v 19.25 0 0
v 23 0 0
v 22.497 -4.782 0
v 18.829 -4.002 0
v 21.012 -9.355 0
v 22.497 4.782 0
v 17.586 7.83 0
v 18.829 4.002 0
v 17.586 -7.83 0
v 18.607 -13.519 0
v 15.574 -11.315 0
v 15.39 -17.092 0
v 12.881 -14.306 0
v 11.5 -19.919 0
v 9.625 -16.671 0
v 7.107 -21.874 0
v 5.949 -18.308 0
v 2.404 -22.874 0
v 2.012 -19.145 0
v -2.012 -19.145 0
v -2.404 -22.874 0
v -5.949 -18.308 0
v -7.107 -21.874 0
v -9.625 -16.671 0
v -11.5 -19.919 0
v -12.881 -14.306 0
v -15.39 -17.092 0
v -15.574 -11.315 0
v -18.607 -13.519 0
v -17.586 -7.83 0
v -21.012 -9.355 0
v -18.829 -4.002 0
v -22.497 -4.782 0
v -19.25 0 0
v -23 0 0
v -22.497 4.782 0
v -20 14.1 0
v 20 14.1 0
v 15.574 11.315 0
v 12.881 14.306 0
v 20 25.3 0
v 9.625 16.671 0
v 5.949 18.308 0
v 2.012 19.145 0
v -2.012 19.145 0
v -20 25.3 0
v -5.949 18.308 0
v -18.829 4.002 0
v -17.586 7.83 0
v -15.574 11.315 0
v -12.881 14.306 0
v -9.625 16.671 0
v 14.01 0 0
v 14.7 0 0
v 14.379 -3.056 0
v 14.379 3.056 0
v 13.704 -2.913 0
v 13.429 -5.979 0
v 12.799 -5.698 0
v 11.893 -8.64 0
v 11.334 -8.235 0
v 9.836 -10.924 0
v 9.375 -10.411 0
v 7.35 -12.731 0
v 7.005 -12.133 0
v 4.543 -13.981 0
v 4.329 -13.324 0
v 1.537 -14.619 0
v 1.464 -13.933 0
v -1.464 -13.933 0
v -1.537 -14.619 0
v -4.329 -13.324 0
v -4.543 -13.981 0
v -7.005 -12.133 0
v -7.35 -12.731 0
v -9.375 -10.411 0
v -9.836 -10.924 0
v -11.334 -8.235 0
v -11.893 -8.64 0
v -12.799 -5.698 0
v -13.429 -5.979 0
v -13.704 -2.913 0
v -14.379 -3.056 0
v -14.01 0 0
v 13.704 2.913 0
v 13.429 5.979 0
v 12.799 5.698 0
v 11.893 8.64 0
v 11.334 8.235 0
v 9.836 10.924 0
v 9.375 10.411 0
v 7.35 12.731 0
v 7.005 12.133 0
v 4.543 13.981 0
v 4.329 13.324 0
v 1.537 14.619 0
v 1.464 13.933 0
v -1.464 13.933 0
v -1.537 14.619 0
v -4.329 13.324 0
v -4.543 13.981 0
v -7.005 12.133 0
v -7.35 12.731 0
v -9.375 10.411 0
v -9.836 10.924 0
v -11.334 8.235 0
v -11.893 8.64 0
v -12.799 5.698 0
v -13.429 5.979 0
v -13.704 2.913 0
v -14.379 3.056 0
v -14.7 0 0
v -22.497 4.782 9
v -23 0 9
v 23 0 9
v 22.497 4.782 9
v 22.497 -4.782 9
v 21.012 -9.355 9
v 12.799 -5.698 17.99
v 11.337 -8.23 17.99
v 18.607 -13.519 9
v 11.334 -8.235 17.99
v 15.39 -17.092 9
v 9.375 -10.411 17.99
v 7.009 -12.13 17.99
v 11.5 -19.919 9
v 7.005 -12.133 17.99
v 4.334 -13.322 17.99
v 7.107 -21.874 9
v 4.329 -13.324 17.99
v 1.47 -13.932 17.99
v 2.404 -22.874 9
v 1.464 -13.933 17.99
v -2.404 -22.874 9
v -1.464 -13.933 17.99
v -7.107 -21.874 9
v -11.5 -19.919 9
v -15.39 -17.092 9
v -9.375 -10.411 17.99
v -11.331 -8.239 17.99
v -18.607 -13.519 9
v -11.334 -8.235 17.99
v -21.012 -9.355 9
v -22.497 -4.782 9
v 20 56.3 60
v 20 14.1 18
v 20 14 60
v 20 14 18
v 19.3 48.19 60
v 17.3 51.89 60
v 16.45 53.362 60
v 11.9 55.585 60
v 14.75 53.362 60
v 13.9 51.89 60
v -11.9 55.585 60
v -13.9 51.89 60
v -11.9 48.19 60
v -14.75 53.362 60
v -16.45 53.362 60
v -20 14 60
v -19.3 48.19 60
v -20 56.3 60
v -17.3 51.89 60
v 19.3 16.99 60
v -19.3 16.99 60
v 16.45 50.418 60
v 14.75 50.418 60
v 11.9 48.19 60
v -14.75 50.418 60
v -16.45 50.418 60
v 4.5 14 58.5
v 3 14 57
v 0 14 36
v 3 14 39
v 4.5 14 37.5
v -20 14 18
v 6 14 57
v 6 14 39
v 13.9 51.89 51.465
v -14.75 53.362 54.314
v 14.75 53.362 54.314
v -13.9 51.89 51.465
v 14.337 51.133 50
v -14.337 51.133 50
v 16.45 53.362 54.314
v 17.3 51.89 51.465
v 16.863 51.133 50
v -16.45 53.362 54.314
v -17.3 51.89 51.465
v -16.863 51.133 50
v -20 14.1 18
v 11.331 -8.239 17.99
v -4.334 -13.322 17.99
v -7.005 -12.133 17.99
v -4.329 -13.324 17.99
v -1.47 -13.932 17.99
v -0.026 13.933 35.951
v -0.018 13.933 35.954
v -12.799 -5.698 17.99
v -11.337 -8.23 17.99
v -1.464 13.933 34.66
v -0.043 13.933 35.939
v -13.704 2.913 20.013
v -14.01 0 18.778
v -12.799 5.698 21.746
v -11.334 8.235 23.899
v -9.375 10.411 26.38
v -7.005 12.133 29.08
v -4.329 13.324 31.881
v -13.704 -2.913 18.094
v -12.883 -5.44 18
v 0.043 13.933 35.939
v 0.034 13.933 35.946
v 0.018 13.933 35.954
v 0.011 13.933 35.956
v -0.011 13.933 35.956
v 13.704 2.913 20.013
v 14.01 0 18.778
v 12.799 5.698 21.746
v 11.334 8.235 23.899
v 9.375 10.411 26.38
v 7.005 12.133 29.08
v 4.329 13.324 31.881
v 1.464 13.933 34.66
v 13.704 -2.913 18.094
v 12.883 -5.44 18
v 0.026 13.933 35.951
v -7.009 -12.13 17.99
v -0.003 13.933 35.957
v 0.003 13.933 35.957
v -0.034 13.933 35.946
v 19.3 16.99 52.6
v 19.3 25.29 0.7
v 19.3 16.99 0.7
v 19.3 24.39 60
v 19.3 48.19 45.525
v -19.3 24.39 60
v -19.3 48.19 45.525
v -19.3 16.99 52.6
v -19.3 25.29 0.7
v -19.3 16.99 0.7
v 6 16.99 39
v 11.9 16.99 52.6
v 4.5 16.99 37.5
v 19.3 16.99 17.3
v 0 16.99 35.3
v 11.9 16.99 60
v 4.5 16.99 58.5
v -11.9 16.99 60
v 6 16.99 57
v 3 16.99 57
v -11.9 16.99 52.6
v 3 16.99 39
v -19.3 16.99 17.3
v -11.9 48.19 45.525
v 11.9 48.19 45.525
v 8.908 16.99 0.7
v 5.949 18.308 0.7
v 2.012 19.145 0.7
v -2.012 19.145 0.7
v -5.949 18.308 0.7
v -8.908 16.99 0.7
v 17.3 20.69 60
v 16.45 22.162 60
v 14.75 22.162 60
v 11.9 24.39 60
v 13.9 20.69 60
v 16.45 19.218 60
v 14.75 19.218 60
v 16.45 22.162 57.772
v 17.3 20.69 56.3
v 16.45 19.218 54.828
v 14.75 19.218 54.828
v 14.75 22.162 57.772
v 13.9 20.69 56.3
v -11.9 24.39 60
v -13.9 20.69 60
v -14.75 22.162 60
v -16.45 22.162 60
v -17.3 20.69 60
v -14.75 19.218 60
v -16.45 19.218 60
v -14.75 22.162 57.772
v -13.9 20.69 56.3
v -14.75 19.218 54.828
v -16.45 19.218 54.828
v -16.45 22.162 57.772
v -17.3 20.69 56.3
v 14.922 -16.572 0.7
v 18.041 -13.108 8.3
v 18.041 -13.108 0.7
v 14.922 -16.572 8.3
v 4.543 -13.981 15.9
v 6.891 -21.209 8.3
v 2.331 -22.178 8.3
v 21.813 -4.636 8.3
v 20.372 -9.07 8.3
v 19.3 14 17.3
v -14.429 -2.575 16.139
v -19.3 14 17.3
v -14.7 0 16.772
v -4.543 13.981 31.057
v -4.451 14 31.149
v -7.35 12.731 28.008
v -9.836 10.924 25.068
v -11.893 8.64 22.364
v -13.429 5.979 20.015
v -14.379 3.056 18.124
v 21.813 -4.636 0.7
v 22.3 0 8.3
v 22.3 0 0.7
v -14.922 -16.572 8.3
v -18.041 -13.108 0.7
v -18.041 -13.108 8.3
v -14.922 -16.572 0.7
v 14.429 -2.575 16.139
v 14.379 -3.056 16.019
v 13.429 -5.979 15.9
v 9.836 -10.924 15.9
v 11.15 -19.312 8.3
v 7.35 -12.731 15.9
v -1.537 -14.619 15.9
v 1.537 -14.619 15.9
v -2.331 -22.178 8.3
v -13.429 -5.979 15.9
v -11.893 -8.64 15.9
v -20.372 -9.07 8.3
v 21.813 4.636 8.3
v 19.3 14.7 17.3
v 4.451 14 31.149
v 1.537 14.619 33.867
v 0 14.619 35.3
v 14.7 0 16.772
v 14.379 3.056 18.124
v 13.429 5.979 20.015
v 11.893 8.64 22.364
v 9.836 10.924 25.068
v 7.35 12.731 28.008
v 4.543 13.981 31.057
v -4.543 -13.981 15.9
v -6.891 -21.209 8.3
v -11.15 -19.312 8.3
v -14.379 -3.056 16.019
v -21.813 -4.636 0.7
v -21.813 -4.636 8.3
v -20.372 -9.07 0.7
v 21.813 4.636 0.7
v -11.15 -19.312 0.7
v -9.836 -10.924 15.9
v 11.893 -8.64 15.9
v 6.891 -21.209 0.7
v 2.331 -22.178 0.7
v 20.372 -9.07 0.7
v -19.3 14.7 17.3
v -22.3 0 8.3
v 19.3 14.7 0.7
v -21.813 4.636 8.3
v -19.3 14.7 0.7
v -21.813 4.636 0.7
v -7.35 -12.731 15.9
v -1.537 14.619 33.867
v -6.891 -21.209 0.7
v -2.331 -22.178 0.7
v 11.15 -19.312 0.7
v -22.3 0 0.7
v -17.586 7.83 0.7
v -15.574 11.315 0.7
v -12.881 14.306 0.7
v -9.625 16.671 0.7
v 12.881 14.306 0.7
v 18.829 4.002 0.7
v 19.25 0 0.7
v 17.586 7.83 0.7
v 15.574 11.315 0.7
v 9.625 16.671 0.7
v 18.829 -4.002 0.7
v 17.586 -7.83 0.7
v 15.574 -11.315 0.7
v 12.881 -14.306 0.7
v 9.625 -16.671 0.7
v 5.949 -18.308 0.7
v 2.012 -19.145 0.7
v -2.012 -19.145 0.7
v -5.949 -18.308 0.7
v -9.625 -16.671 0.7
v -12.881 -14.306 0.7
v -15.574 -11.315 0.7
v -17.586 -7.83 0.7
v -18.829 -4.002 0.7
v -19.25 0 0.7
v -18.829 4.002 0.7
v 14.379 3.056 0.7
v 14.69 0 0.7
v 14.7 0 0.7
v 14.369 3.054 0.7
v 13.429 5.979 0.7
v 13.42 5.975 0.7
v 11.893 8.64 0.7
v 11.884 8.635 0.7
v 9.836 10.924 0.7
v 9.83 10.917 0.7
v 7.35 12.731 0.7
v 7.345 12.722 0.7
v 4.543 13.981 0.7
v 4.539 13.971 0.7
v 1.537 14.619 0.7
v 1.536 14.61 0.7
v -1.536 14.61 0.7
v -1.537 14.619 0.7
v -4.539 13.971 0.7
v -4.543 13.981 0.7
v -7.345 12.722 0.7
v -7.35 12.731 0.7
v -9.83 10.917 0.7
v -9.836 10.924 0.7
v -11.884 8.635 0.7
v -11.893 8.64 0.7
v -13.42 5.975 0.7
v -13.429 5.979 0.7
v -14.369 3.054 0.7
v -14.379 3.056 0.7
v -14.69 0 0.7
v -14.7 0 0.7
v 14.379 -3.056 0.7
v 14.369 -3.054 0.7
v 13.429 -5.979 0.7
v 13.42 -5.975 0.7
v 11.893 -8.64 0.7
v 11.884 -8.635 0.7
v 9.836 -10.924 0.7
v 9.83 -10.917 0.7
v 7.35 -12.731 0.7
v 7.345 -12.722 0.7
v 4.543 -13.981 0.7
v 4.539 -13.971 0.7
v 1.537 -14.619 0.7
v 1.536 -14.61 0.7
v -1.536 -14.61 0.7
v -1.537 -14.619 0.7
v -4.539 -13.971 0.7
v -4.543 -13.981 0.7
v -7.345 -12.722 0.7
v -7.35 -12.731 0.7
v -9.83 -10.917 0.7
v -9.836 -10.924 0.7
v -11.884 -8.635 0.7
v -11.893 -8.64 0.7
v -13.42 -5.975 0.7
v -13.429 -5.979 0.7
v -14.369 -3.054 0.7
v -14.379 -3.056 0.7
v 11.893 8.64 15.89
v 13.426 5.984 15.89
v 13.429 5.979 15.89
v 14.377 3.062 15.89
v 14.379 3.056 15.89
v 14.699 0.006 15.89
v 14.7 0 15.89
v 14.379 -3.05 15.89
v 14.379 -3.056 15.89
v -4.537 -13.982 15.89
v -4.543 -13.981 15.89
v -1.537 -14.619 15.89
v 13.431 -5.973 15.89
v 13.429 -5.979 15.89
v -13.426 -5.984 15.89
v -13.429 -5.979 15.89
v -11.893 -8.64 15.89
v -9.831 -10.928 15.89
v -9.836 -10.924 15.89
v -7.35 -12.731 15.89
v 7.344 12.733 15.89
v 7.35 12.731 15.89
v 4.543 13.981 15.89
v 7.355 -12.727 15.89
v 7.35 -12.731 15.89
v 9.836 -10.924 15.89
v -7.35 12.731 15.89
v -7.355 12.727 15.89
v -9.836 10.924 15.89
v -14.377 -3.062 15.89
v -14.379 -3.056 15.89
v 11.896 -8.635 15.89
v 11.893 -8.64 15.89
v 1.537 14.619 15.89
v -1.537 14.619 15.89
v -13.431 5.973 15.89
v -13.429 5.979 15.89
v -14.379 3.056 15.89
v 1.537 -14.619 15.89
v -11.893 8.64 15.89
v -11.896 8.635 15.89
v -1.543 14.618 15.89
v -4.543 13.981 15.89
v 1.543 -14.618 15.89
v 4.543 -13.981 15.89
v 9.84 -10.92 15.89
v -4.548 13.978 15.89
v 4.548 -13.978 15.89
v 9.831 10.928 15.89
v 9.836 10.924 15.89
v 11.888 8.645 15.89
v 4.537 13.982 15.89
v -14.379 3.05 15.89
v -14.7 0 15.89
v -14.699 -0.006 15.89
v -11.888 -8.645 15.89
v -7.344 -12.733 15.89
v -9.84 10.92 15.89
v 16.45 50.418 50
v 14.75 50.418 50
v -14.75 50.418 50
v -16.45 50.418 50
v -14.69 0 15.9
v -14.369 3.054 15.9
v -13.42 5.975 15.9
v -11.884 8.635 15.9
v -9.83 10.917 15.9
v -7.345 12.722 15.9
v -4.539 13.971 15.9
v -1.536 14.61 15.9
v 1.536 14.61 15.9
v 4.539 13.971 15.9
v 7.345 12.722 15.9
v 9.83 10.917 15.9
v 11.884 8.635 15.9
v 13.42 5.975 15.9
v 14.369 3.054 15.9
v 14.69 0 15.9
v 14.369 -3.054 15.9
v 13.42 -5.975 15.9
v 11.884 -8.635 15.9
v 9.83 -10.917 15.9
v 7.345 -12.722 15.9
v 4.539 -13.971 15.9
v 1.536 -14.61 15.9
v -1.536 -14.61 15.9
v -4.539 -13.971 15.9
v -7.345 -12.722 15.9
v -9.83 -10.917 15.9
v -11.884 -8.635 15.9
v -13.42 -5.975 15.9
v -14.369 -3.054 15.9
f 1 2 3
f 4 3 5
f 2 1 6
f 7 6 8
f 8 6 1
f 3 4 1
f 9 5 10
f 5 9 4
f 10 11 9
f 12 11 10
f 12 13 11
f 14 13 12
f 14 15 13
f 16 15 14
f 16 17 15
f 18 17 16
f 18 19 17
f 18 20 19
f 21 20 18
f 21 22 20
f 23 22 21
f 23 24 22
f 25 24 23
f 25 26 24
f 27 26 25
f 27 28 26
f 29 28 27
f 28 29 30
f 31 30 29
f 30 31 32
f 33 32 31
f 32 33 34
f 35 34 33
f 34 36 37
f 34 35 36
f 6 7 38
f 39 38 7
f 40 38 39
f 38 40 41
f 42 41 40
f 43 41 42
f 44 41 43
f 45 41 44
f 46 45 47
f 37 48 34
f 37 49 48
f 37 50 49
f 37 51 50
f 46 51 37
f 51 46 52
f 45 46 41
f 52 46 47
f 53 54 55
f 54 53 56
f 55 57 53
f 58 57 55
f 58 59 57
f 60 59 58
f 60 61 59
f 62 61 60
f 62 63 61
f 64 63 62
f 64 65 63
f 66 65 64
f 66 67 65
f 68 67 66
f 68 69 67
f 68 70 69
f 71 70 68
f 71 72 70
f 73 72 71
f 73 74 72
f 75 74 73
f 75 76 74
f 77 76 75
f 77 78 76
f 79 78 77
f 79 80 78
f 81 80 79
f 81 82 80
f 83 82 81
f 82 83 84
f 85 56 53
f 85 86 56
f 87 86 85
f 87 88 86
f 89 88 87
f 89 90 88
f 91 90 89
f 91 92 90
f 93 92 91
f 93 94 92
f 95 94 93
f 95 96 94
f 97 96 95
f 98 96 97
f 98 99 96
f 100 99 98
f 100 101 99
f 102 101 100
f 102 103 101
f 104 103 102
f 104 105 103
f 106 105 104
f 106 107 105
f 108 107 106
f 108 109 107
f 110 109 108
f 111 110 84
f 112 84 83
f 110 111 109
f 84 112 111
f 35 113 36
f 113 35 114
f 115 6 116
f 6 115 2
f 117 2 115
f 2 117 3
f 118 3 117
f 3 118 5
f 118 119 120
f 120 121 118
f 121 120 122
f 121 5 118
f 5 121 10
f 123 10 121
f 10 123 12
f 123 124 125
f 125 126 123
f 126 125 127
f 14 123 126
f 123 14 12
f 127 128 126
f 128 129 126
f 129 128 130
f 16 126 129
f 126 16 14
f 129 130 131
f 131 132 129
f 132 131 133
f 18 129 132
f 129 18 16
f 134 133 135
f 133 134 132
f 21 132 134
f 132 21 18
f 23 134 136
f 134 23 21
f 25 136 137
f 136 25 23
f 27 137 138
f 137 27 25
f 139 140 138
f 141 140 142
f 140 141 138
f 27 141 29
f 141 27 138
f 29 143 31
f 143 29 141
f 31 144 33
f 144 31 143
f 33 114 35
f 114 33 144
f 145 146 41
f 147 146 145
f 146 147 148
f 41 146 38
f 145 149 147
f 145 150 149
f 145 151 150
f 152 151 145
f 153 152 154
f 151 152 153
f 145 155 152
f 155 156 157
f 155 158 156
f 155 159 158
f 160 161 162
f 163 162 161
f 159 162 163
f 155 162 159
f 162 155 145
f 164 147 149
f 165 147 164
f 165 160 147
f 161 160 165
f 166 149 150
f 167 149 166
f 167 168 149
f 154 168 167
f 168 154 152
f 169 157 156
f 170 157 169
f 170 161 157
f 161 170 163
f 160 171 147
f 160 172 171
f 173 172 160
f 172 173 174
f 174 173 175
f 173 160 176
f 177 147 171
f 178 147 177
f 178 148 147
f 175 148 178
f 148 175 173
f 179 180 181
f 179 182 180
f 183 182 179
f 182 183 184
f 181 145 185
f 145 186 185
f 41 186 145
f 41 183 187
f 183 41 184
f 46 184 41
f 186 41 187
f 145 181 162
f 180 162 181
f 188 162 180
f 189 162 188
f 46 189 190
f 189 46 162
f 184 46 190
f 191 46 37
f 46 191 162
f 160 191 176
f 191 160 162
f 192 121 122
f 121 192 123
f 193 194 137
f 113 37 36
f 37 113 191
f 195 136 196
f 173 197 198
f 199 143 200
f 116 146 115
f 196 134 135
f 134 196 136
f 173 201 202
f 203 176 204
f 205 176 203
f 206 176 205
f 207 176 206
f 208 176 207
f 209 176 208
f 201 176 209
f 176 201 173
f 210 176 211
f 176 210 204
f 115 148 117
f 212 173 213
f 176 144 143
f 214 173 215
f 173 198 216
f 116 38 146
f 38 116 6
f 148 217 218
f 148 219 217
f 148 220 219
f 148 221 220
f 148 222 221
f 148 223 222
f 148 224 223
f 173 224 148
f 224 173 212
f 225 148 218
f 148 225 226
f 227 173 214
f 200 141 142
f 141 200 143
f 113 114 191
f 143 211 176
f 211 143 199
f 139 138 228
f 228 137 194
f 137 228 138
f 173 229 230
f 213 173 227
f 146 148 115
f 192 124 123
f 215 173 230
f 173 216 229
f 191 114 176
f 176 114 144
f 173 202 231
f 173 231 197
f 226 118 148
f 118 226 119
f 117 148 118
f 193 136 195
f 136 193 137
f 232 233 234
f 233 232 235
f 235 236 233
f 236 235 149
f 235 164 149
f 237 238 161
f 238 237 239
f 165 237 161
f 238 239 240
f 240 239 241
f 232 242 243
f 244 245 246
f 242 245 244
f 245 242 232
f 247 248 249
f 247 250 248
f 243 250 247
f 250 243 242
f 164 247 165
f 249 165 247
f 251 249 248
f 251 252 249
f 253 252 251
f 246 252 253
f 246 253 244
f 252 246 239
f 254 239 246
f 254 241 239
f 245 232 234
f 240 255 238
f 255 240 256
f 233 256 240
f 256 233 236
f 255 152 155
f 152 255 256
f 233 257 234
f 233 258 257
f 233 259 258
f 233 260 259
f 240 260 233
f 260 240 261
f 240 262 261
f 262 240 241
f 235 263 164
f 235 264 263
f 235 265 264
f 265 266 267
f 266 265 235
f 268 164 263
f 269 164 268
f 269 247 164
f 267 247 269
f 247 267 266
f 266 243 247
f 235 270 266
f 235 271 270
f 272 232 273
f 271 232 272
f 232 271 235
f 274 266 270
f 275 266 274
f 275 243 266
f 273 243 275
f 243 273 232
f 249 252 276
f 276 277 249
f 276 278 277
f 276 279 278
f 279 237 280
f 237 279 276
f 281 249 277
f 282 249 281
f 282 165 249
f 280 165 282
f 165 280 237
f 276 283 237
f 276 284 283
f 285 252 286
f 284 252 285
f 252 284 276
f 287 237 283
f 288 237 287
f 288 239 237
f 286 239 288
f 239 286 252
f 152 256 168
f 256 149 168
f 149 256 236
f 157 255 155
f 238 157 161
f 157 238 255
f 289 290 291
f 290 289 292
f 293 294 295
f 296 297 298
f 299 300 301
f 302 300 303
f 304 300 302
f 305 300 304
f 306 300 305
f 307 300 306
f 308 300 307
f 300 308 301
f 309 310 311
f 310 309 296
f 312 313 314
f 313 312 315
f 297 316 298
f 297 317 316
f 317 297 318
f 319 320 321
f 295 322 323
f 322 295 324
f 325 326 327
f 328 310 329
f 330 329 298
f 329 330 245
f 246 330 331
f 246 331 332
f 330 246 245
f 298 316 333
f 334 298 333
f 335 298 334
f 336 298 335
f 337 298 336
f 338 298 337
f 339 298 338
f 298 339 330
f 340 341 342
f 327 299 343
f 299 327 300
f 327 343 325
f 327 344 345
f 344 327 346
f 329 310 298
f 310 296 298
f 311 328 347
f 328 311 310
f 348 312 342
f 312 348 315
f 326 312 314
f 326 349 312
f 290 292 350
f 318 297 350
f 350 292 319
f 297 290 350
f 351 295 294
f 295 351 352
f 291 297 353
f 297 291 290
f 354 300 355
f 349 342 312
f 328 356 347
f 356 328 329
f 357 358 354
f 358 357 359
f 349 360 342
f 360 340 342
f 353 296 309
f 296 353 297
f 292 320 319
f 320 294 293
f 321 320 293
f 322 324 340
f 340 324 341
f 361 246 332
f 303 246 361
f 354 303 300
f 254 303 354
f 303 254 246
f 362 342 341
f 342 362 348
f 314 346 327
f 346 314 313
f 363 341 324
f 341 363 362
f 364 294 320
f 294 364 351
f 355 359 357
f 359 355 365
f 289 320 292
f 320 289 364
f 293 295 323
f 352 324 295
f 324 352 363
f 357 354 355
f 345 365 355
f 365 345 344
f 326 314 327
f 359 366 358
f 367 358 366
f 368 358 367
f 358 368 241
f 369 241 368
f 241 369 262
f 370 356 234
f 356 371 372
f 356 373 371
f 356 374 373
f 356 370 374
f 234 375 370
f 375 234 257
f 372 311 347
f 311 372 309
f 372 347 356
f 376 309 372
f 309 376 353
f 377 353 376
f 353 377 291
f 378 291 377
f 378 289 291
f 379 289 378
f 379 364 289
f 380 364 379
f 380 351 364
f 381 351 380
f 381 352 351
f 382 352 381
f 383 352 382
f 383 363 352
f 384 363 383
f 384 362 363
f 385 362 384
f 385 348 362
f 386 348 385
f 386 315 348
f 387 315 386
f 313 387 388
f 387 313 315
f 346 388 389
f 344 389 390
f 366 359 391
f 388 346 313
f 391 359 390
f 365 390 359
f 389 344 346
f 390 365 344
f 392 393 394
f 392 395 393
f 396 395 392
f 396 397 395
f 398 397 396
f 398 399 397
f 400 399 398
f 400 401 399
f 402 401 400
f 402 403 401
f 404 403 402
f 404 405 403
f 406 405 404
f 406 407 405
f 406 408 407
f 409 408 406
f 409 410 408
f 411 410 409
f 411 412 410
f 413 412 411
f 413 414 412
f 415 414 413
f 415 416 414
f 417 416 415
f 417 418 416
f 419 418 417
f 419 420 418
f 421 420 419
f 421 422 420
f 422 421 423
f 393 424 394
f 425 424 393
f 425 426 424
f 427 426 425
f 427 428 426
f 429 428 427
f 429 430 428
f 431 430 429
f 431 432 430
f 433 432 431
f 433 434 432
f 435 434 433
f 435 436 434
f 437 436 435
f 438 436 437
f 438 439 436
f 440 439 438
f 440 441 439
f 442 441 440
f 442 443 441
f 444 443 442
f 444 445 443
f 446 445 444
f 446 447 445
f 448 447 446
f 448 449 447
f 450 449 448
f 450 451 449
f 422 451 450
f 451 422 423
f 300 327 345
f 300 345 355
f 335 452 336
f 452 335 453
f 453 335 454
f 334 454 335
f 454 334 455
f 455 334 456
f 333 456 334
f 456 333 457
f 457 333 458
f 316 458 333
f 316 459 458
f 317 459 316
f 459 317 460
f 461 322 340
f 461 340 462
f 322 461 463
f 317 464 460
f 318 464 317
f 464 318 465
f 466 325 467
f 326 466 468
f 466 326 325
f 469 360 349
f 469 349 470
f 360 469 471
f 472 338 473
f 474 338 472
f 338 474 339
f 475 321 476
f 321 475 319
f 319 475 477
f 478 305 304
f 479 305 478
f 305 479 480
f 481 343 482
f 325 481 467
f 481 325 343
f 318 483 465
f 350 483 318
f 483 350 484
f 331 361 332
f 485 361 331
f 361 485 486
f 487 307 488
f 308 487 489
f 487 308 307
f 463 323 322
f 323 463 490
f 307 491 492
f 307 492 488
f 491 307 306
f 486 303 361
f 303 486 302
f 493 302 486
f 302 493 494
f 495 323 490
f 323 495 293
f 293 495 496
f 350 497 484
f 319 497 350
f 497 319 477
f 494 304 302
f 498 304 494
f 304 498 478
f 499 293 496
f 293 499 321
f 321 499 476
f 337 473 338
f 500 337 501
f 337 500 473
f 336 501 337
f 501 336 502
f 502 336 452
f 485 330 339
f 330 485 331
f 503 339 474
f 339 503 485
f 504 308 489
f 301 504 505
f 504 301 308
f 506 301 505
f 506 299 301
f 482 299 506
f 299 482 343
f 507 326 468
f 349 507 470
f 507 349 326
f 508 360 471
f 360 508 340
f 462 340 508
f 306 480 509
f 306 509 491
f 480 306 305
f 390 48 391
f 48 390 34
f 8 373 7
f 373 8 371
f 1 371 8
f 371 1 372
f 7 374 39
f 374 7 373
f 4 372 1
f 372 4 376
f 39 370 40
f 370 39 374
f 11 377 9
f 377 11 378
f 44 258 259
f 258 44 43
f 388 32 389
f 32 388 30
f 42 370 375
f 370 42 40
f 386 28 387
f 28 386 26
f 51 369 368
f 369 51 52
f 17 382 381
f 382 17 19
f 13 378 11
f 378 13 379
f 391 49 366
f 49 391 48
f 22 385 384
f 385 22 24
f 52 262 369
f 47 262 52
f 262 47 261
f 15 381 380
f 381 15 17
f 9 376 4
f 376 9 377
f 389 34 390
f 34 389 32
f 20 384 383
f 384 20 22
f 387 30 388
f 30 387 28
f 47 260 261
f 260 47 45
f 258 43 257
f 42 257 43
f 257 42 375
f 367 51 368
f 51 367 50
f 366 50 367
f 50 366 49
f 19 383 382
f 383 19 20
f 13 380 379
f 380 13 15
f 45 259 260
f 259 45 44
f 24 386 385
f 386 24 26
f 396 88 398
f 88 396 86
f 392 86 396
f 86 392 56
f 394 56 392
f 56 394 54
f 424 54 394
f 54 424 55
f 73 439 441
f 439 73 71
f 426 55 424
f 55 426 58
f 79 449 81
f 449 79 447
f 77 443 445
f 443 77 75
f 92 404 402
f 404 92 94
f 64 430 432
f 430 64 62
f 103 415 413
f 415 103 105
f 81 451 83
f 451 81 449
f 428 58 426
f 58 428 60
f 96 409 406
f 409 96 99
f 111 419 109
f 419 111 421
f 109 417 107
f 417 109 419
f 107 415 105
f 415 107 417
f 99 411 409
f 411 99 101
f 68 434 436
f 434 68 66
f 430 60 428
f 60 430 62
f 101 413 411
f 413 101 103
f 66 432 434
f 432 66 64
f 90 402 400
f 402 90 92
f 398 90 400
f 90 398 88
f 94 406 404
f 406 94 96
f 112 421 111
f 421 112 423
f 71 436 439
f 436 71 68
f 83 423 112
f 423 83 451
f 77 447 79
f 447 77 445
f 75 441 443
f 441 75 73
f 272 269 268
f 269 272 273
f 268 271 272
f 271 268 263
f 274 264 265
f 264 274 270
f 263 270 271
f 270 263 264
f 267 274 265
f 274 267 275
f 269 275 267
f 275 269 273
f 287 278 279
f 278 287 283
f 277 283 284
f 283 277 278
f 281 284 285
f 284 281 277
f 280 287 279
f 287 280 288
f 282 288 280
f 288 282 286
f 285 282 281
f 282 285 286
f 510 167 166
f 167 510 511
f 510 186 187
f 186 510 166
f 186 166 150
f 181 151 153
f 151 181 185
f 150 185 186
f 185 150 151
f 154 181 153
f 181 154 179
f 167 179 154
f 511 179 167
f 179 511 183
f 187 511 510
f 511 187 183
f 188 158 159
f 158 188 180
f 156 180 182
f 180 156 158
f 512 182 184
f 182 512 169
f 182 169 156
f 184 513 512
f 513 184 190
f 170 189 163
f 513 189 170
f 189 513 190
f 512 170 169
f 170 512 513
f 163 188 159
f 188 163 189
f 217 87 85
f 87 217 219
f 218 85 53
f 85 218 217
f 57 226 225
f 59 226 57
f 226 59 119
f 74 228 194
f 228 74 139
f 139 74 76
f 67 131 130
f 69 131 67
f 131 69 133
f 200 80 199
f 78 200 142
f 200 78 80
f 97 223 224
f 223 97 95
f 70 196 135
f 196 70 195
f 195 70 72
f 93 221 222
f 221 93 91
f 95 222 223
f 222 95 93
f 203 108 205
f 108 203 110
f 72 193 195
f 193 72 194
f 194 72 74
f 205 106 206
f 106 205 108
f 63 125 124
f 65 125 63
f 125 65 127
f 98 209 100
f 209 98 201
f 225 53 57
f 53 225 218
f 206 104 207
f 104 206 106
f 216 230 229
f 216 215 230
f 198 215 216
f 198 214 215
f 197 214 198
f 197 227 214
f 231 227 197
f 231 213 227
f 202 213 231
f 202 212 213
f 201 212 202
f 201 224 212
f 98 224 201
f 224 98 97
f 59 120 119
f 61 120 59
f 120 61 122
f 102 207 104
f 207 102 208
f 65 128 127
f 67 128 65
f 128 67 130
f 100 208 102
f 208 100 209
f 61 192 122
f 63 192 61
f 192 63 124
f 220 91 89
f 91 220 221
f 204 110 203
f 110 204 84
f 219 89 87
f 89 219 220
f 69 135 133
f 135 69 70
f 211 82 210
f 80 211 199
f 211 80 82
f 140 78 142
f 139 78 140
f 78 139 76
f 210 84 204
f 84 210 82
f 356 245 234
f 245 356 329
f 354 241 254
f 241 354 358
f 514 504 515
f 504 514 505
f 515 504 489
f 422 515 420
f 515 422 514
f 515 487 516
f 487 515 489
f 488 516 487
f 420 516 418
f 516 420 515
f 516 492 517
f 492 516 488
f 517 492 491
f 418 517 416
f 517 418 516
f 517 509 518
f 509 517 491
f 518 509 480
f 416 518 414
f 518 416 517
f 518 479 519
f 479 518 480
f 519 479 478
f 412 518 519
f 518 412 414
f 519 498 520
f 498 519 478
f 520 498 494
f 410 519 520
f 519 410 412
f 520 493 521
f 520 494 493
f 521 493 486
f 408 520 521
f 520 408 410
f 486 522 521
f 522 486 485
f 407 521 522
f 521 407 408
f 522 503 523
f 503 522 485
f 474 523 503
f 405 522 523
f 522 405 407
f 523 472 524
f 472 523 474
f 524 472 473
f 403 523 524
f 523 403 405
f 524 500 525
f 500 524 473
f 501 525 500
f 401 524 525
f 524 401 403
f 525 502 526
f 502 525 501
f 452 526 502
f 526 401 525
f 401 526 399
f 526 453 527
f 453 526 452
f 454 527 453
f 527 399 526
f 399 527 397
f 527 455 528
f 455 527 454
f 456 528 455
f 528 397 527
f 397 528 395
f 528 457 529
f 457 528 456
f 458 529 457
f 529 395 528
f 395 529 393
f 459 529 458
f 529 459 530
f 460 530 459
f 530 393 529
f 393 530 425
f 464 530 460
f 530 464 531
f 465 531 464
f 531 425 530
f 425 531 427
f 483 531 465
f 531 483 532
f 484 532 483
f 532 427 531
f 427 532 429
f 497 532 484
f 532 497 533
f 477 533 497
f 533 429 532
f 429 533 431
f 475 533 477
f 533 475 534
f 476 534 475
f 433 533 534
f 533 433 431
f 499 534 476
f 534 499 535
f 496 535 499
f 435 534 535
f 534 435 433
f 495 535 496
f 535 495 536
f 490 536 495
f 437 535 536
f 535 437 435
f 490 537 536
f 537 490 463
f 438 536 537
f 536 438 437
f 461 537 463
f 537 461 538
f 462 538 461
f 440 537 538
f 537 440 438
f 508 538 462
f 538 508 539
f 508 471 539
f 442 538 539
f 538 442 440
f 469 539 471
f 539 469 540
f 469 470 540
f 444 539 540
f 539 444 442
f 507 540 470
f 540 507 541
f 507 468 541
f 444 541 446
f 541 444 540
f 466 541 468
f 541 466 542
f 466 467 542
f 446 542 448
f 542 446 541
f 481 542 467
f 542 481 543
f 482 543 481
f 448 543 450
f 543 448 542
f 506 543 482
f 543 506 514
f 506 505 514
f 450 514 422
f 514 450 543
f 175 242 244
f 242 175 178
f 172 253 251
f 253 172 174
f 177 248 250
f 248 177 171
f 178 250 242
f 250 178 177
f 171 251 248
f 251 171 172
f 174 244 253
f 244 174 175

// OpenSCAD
printheadRadius=14;
fanSize=40;
ductRadius=9;
outletGap=4.55;
attachHeight=60;
attachBraceWidth=5;
attachCutHeight=36.4;// there is some flexibility in the height of the cut.  This is the peak height - the sides then slope down at 45 degrees.  The height can never be less than 2*ductRadius+printheadRadius
attachYOffset=0; //allows you to move the attachment along the y axis to center the duct
attachXOffset=4.5; //allows you to move the SCReW HOLE along the x axis to center the duct
wallThickness=0.7;

mountScrewWidth=3;
mountThickness=3;

fanMountWidth=7.4; //how much extra to add at the edges for mounts, hole automagically placed halfway
fanMountHole=1.7; //radius of the screw hole
fanMountDepth=10; //depthof screw hole

fudge=0.01;

if (fanSize>attachHeight) {
	echo("WARNING: fan size is greater than attachHeight.  Model will not be 45-degree rule compatible");
}

module roundDuct(ductRadius) {
	polygon(points=[[0,0],[0,2*ductRadius],[ductRadius,ductRadius],[ductRadius,0]]);
}

module fanScrewMount () {
	rotate([0,-90,0]) 
		linear_extrude(height=fanMountWidth) polygon(points=[
			[0,0],
			[fanMountWidth,0],
			[fanMountWidth,fanMountWidth],
		]);
}

//The printhead we're doing all this around
//color("red") cylinder(r=printheadRadius,h=attachHeight);

// We'll cut parts out after we make the whole thing
difference() {
	//do the making
	union() {
		// stuff around the printhead
		rotate_extrude() translate([printheadRadius,0,0]) roundDuct(ductRadius);
		//fan mount
		translate([fanSize/2,printheadRadius,0]) rotate([0,-90,0]) linear_extrude(height=fanSize)
			polygon(points=[
				[0,max(attachYOffset,0)],
				[attachHeight,max(attachYOffset,0)],
				[attachHeight,fanSize+max(attachYOffset,0)+mountThickness-wallThickness],
				[0,max(ductRadius,ductRadius+attachYOffset)+mountThickness-wallThickness]]
			);
		//hull to make them attach sanely
		// ceter part cut later
		hull () {
			rotate_extrude() translate([printheadRadius,0,0]) roundDuct(ductRadius);
			rotate([0,90,90]) translate([0,-fanSize/2,max(printheadRadius,printheadRadius+attachYOffset)]) rotate([0,0,90]) linear_extrude(height=0.1) polygon(points=[
					[0,0],
					[fanSize,0],
					[fanSize,2*ductRadius],
					[fanSize/2,4*ductRadius],
					[0,2*ductRadius]
					]
			);
		}
		if (attachYOffset<0) {
			translate([-fanSize/2,printheadRadius+attachYOffset,0]) cube([fanSize,max(mountThickness, -attachYOffset+wallThickness), attachHeight]);
		}
	}
	// center for printhead
	cylinder(r=printheadRadius+fudge,h=4*ductRadius);
	translate([0,0,4*ductRadius]) cylinder(r1=printheadRadius,r2=0,h=printheadRadius);

	//fan
	translate([fanSize/2-wallThickness,printheadRadius-fudge,0]) difference() {
		rotate([0,-90,0]) linear_extrude(height=fanSize-2*wallThickness) 
			polygon(points=[
				[wallThickness,max(attachYOffset,0)+mountThickness],
				[attachHeight+fudge,max(attachYOffset,0)+mountThickness],
				[attachHeight+fudge,fanSize-2*wallThickness+max(attachYOffset,0)+mountThickness],
				[wallThickness,max(ductRadius, ductRadius+attachYOffset)+mountThickness-wallThickness],
		]);
		translate([0,mountThickness+max(attachYOffset,0),attachHeight-fanMountWidth]) fanScrewMount();
		translate([-fanSize+2*wallThickness+fanMountWidth,max(attachYOffset,0)+mountThickness,attachHeight-fanMountWidth]) fanScrewMount();
		translate([-fanMountWidth,fanSize-fanMountWidth-2*wallThickness+max(attachYOffset,0)+mountThickness,0]) cube([fanMountWidth,fanMountWidth,attachHeight]);
		translate([-fanSize+2*wallThickness,fanSize-fanMountWidth-2*wallThickness+max(attachYOffset,0)+mountThickness,0]) cube([fanMountWidth,fanMountWidth,attachHeight]);
	}
	
	// this one is complicated, we only want to make cuts that are not covered by the duct itself.
	// empty space in the duct
	difference() {
		hull () {
			rotate_extrude() translate([printheadRadius+wallThickness,wallThickness,0]) roundDuct(ductRadius-2*wallThickness);
			rotate([0,90,90]) translate([-wallThickness,-fanSize/2+wallThickness,max(printheadRadius,printheadRadius+attachYOffset)]) rotate([0,0,90]) linear_extrude(height=wallThickness) polygon(points=[
					[0,0],
					[fanSize-2*wallThickness,0],
					[fanSize-2*wallThickness,2*ductRadius-2*wallThickness],
					[fanSize/2-wallThickness,4*ductRadius-2*wallThickness],
					[0,2*ductRadius-2*wallThickness]
					]
			);
		}
		cylinder(r=printheadRadius+wallThickness,h=4*ductRadius);
	}
	#rotate([0,90,90]) translate([-wallThickness,-fanSize/2+wallThickness,max(printheadRadius+wallThickness,printheadRadius+attachYOffset+wallThickness)]) rotate([0,0,90]) linear_extrude(height=mountThickness-wallThickness) polygon(points=[
			[0,0],
			[fanSize-2*wallThickness,0],
			[fanSize-2*wallThickness,2*ductRadius-2*wallThickness],
			[fanSize/2-wallThickness,4*ductRadius-2*wallThickness],
			[0,2*ductRadius-2*wallThickness]
			]
		);

	//duct inners
	rotate_extrude() translate([printheadRadius+wallThickness-fudge,wallThickness,0]) roundDuct(ductRadius-2*wallThickness);
	//gap to let air out
	translate([0,0,-fudge]) difference() {
		cylinder(r=printheadRadius+wallThickness+outletGap,h=wallThickness+2*fudge);
		cylinder(r=printheadRadius+wallThickness,h=wallThickness+2*fudge);
	}
	
	//screw slot to mount block
	translate([attachXOffset,-2*fudge+attachYOffset,0]) hull() {
		#translate([-mountScrewWidth/2, printheadRadius,4*ductRadius+mountScrewWidth]) rotate([0,45,0]) cube([mountScrewWidth/sqrt(2),max(mountThickness,-attachYOffset+wallThickness)+4*fudge,mountScrewWidth/sqrt(2)]);
		translate([-mountScrewWidth/2, printheadRadius,attachHeight-mountScrewWidth]) rotate([0,45,0]) cube([mountScrewWidth/sqrt(2),max(mountThickness,-attachYOffset+wallThickness)+4*fudge,mountScrewWidth/sqrt(2)]);
	}
	
	//screw holes for mounting fan
	#translate([fanSize/2,printheadRadius-fudge+max(attachYOffset,0)+mountThickness-wallThickness,0]) {
		translate([-wallThickness-fanMountWidth/2,wallThickness+fanMountWidth/2,attachHeight-fanMountDepth]) cylinder(r=fanMountHole,h=fanMountDepth);
		translate([wallThickness+fanMountWidth/2-fanSize,wallThickness+fanMountWidth/2,attachHeight-fanMountDepth]) cylinder(r=fanMountHole,h=fanMountDepth);
		translate([-wallThickness-fanMountWidth/2,-wallThickness-fanMountWidth/2+fanSize,attachHeight-fanMountDepth]) cylinder(r=fanMountHole,h=fanMountDepth);
		translate([wallThickness+fanMountWidth/2-fanSize,-wallThickness-fanMountWidth/2+fanSize,attachHeight-fanMountDepth]) cylinder(r=fanMountHole,h=fanMountDepth);
	}
}
